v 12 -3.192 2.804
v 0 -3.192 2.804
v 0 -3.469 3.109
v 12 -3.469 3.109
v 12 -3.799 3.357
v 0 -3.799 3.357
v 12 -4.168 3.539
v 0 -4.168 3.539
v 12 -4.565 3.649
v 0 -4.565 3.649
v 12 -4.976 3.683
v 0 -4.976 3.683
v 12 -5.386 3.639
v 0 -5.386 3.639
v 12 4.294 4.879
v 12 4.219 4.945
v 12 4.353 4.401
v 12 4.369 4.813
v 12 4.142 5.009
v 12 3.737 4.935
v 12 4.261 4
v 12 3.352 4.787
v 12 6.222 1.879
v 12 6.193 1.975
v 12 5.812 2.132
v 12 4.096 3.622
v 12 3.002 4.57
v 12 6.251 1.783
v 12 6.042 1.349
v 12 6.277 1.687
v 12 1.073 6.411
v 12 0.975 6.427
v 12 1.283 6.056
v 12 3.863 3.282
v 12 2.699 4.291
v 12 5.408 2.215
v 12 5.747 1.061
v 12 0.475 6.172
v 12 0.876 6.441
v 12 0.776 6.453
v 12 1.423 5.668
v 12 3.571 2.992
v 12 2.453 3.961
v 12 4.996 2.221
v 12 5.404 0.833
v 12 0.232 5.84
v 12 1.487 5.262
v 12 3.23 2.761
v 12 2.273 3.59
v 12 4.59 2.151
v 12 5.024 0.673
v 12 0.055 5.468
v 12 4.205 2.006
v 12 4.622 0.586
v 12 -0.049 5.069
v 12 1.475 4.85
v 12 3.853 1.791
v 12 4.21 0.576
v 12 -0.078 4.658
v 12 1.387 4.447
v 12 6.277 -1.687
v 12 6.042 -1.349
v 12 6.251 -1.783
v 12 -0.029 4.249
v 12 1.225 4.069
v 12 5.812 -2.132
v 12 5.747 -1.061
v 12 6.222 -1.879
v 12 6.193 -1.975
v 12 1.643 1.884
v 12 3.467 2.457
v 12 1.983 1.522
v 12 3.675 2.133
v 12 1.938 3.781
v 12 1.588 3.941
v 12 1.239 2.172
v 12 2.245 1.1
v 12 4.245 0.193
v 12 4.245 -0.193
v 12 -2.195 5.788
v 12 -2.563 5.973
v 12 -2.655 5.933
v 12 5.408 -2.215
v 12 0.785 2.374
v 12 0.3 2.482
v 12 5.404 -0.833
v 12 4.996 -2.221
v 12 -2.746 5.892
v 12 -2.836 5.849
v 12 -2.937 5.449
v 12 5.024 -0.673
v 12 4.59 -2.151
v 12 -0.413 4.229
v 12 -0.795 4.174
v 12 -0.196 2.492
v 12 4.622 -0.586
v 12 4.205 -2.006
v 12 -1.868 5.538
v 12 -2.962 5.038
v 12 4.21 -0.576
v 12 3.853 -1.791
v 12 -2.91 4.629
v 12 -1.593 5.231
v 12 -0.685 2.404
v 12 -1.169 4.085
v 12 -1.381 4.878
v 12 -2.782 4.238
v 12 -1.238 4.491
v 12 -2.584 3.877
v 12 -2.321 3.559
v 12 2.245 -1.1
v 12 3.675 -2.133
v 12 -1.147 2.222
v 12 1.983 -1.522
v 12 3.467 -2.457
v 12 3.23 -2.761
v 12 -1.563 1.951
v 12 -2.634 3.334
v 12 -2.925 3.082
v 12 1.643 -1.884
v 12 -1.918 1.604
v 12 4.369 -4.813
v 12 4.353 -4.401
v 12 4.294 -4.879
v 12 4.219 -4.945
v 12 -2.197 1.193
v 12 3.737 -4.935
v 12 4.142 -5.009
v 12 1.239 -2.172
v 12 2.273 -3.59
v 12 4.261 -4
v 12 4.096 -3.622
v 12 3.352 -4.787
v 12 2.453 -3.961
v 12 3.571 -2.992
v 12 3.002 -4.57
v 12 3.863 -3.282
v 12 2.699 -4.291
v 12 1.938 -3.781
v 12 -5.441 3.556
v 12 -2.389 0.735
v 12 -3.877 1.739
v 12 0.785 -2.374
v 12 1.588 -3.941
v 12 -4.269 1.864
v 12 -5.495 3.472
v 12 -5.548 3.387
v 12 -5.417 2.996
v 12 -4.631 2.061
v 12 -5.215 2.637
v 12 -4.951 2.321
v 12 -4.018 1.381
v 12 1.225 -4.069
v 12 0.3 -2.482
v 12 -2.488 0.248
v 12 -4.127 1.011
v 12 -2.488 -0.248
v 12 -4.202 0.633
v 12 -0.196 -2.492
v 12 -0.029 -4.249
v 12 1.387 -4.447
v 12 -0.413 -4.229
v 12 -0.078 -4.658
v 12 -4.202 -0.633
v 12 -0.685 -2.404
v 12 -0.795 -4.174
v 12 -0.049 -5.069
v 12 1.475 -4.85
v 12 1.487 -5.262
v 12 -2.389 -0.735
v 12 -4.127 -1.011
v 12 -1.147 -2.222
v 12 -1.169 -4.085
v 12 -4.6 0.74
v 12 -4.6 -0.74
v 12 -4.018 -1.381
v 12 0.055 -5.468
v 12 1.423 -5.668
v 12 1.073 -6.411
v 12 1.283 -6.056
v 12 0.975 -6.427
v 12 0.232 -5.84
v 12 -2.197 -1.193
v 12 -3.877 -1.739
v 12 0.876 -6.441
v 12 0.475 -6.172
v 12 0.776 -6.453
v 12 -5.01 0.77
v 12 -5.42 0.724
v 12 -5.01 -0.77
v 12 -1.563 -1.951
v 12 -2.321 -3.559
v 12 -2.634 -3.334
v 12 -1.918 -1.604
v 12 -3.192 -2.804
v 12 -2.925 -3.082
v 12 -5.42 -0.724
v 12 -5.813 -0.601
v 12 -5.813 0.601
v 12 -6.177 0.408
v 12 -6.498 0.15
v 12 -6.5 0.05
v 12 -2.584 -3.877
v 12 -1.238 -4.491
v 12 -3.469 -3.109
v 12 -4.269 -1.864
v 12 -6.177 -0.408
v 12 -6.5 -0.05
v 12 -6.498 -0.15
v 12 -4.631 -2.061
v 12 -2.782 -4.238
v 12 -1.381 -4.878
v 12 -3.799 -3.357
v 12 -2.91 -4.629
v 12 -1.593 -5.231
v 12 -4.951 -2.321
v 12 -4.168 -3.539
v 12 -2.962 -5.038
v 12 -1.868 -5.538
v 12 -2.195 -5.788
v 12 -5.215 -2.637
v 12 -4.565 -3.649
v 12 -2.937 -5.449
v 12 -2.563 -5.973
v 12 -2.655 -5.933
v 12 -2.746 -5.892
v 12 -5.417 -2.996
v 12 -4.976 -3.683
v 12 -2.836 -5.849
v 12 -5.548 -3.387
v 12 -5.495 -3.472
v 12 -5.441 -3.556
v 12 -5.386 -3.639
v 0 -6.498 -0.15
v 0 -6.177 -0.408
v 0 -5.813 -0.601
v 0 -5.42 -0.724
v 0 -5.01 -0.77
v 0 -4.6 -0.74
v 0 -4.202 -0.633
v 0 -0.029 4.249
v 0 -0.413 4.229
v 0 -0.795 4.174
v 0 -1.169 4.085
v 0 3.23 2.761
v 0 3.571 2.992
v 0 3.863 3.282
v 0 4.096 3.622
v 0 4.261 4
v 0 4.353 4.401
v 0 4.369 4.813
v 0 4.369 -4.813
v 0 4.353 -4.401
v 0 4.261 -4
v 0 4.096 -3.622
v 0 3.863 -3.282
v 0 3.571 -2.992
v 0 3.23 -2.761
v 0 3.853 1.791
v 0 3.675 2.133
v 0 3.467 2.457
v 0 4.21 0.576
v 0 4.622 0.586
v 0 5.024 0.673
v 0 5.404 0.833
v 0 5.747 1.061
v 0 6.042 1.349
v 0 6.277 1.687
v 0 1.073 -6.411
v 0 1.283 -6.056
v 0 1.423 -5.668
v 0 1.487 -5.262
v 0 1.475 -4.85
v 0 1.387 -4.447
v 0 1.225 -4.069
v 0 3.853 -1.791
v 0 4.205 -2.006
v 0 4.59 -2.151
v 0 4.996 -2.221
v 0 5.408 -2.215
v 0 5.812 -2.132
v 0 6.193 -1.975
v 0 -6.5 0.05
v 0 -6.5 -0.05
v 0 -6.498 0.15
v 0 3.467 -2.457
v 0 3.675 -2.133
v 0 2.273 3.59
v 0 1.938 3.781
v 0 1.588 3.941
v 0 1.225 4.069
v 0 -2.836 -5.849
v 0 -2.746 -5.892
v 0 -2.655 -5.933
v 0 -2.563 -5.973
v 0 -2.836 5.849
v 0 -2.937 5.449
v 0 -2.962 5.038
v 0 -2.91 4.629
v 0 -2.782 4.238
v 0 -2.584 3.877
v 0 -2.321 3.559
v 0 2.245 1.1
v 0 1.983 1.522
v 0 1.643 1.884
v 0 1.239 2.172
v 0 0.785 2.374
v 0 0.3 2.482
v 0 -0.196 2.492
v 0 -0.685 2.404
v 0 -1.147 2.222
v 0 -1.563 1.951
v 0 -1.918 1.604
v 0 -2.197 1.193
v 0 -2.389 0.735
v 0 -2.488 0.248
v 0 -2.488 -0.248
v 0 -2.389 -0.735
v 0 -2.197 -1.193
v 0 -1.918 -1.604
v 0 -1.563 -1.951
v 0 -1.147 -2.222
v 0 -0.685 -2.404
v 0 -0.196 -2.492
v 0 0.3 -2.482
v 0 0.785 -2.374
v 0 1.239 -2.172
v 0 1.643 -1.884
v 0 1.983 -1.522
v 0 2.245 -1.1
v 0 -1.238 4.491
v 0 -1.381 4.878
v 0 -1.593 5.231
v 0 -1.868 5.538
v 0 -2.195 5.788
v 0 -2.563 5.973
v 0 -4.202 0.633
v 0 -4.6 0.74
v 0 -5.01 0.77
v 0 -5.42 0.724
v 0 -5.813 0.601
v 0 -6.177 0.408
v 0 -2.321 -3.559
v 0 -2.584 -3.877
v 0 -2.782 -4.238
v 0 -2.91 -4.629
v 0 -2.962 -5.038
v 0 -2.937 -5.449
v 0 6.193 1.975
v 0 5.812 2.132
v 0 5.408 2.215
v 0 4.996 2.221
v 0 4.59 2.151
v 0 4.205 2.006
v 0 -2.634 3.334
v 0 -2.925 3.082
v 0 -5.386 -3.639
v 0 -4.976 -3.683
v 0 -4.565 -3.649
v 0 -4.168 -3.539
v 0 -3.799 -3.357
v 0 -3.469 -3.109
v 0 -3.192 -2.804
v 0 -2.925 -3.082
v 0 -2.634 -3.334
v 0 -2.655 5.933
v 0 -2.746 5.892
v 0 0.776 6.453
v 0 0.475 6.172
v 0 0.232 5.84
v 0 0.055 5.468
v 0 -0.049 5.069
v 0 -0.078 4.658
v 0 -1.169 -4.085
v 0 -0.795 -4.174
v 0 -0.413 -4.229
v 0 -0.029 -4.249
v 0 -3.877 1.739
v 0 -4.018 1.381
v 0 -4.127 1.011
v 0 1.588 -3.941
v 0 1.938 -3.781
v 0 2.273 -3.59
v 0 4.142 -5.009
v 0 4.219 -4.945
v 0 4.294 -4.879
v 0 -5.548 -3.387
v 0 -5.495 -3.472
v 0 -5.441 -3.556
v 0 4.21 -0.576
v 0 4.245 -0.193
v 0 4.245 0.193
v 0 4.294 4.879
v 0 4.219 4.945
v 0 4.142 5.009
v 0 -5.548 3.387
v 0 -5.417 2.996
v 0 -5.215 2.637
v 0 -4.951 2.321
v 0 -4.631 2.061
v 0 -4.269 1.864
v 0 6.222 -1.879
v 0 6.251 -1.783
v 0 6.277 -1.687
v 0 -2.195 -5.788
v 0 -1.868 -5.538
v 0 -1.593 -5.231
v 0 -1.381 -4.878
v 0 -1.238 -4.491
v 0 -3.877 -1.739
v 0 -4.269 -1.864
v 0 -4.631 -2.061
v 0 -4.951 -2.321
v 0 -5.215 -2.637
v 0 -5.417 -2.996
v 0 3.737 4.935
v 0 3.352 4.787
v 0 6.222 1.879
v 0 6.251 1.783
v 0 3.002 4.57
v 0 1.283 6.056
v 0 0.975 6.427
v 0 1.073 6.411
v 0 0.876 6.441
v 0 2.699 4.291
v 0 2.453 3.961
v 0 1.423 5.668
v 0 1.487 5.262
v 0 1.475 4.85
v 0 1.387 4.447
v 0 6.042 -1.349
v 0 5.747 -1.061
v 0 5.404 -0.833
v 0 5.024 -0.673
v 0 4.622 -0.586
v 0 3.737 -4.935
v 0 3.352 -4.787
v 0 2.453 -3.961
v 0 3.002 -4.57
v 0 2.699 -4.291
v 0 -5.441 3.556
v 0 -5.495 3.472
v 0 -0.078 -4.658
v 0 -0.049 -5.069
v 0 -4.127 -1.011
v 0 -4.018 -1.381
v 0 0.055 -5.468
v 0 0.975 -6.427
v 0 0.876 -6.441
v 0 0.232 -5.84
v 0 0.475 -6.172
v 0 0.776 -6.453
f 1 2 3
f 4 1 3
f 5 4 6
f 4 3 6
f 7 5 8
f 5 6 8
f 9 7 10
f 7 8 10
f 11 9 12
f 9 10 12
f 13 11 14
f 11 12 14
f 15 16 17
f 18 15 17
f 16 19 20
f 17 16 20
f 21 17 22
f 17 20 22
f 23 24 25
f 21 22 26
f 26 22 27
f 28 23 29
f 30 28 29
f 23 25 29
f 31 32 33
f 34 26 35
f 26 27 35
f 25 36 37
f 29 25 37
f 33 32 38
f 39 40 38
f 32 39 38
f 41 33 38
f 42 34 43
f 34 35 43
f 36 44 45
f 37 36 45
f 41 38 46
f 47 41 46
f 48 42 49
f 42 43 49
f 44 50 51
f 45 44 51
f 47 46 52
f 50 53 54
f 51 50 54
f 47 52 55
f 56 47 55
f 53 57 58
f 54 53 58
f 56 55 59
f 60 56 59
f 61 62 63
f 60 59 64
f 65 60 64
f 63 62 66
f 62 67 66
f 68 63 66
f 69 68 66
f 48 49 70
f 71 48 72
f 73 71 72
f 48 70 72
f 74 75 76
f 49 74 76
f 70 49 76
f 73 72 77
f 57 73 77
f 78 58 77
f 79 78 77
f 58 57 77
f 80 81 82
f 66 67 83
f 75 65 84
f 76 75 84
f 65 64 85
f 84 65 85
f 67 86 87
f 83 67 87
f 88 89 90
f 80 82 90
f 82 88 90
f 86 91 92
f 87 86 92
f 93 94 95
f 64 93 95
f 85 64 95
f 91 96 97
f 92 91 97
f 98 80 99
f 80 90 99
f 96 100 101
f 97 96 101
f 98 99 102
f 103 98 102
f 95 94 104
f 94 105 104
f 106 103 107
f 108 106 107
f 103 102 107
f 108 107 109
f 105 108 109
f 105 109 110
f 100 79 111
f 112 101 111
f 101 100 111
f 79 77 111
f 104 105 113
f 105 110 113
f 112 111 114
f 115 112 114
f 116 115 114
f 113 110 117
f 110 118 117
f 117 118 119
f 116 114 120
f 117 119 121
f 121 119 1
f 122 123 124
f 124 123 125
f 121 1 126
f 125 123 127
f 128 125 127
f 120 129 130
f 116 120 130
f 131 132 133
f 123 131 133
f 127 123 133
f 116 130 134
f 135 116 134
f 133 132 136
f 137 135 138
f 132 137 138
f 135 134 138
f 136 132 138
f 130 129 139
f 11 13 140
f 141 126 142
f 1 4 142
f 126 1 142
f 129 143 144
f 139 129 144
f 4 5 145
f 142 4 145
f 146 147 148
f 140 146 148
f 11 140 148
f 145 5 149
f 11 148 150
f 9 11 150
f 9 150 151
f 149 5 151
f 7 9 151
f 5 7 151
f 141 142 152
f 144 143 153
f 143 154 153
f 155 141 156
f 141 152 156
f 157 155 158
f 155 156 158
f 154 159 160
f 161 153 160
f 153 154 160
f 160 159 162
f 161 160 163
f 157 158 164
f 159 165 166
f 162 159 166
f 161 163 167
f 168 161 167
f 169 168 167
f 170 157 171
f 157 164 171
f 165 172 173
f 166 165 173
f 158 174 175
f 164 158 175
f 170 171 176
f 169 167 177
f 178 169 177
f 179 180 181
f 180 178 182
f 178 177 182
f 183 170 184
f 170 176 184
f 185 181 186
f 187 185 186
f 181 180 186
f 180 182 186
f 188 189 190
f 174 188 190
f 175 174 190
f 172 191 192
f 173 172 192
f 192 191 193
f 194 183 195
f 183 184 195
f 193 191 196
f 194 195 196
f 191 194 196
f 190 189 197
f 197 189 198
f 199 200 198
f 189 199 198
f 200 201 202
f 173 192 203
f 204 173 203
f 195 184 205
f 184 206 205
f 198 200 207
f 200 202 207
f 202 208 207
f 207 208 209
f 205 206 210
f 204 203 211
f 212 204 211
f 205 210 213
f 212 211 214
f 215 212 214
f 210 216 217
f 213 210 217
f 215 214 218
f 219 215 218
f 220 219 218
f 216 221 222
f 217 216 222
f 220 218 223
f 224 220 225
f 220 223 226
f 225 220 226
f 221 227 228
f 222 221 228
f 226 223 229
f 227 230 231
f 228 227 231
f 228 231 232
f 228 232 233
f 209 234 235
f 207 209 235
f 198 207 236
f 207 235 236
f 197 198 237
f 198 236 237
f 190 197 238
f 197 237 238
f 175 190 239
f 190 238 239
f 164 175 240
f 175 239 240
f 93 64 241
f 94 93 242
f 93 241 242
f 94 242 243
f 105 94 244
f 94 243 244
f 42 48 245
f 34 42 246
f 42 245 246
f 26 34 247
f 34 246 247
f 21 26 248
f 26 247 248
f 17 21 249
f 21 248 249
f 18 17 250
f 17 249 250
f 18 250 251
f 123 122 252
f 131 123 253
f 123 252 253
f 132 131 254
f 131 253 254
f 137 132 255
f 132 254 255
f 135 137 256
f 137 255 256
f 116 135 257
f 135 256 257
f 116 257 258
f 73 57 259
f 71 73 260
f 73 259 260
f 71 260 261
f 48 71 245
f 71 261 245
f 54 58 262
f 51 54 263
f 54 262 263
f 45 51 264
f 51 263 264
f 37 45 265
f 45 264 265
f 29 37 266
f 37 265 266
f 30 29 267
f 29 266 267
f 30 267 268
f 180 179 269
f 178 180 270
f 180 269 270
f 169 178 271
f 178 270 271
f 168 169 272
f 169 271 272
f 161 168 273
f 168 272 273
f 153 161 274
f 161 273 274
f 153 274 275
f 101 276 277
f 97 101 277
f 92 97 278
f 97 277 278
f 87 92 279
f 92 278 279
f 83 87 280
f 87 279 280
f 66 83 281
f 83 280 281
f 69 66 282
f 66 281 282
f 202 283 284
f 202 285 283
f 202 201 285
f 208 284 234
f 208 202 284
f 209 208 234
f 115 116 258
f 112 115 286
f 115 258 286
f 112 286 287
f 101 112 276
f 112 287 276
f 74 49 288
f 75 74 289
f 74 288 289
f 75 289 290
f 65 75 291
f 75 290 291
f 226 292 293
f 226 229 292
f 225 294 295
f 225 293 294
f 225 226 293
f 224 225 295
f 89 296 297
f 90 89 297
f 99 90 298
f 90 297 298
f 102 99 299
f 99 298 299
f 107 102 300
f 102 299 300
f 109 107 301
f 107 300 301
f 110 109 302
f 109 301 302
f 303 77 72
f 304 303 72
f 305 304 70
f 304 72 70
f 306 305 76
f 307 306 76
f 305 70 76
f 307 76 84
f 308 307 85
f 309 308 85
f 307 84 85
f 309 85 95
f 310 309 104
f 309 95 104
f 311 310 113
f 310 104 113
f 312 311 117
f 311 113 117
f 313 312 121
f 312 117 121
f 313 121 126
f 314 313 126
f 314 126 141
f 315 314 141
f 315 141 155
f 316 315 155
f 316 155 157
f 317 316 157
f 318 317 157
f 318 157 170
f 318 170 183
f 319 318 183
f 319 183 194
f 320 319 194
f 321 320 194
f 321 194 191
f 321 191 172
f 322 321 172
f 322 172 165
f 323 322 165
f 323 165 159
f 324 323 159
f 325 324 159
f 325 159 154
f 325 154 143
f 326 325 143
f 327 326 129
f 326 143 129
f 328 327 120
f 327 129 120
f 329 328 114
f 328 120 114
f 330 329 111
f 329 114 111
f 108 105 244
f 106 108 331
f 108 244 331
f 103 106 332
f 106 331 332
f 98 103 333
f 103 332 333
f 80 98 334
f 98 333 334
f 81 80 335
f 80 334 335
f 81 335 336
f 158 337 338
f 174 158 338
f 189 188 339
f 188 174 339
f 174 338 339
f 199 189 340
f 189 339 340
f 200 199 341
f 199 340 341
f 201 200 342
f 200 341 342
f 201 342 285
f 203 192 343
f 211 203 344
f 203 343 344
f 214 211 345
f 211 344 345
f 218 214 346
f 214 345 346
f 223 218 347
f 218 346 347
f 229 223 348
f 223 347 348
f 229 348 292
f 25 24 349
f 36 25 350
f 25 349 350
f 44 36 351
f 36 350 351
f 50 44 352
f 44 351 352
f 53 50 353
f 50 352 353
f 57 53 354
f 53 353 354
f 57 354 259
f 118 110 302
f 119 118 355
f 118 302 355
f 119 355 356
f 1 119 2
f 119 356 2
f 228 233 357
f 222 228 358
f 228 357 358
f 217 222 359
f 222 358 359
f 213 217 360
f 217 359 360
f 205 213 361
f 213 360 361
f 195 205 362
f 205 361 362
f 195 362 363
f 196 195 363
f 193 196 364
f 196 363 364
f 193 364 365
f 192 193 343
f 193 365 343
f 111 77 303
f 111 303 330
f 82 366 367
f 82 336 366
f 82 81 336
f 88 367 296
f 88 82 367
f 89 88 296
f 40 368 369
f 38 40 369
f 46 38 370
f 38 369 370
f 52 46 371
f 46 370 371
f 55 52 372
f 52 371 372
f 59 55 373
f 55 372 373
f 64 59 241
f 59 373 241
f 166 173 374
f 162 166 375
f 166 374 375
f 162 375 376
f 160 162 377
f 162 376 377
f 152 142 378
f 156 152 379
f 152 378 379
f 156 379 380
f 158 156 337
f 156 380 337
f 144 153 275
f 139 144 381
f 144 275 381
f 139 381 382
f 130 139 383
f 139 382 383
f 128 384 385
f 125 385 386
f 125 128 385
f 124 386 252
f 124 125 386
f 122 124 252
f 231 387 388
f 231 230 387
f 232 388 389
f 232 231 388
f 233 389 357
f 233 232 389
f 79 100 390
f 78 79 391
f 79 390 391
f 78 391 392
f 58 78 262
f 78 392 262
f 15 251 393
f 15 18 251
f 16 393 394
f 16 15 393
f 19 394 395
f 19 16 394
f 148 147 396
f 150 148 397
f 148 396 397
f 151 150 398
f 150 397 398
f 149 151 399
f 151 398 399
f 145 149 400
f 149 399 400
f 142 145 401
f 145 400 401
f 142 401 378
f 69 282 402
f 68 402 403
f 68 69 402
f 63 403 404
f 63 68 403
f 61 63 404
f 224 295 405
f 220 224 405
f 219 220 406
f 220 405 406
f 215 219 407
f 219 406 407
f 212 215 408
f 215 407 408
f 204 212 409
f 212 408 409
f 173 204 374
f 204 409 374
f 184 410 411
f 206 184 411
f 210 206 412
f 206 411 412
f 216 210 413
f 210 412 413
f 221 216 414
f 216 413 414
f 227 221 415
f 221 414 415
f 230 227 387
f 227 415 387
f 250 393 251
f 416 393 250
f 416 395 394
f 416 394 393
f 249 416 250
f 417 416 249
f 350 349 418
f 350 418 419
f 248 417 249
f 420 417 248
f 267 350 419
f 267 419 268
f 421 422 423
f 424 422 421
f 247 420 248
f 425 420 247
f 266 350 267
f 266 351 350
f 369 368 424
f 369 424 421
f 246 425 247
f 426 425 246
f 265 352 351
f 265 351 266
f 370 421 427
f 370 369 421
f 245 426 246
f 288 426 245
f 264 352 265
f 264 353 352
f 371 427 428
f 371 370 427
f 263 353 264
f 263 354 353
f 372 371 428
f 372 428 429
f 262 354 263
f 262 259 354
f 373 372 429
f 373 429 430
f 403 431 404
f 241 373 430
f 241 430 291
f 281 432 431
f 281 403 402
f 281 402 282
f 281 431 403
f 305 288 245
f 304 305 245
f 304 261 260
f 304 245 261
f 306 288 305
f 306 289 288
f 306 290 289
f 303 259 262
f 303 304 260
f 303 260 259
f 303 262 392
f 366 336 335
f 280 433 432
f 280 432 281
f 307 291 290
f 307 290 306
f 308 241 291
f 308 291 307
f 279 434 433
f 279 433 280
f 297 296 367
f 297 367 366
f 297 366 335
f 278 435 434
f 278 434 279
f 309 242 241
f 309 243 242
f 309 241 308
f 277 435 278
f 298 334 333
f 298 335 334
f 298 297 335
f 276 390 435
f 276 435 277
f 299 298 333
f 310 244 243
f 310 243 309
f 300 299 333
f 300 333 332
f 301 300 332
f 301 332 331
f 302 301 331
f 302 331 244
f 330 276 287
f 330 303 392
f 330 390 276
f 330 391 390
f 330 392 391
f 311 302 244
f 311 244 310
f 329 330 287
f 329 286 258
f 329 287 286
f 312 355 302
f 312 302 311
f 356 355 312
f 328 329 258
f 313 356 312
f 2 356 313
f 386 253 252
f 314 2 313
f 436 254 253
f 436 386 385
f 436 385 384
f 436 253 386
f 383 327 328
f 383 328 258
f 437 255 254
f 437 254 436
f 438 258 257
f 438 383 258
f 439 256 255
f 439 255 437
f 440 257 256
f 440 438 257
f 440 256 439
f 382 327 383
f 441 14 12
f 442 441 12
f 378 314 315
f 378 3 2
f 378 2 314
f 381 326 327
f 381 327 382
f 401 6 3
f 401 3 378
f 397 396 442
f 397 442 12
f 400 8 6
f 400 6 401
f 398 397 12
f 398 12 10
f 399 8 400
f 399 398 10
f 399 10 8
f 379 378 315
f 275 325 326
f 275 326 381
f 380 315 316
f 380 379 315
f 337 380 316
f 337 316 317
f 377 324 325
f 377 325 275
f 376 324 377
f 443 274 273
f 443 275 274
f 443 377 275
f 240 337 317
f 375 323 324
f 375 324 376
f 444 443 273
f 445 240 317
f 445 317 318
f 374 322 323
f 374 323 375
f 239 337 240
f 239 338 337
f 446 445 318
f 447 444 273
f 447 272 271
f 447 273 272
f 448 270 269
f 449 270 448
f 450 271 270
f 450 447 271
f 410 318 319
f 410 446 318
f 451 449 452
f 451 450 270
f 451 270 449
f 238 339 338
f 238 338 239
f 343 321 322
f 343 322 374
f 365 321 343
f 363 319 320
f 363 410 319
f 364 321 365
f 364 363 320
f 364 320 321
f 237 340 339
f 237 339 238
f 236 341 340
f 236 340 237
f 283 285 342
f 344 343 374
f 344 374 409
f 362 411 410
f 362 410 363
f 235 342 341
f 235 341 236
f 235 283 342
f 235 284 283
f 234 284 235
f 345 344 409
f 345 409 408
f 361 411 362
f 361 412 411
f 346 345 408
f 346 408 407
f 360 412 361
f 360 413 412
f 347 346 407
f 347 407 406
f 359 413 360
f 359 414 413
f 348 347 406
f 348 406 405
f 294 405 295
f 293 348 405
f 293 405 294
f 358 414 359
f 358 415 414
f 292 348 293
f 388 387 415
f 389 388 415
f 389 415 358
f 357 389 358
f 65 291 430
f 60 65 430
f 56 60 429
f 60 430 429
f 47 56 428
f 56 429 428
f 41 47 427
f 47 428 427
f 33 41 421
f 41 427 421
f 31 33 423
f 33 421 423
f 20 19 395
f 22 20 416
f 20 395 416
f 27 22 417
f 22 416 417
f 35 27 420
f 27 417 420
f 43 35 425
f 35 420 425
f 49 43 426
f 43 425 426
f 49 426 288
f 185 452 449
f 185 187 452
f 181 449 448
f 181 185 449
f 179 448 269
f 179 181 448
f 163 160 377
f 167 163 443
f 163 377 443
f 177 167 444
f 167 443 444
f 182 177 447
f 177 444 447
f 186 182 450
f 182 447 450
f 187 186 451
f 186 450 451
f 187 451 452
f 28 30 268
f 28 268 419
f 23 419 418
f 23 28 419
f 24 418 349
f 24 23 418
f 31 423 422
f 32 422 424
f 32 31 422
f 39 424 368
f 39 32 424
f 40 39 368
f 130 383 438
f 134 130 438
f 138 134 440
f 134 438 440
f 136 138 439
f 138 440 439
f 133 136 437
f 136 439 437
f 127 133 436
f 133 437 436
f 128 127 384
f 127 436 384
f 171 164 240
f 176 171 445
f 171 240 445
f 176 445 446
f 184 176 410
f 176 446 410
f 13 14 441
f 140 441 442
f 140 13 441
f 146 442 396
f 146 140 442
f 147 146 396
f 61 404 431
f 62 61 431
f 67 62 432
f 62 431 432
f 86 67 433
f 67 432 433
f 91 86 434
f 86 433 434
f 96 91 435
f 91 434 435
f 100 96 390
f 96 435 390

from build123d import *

# Parameters (mm, degrees)
BASPROSKE_W         = 12
BASPROSKE_H         = 6.5
TOOTHCUT_DEPTH      = 16.116216458
TEETHCUTS_COUNT     = 11
TEETHCUTS_ANGLE     = 327.272727273
BORSKE_R            = 2.5
BORE_DEPTH          = 50.0000508
BOSS_EXTRUDE1_DEPTH = 12


with BuildPart() as part:
    # BasProSke → Base-Revolve (revolve)
    with BuildSketch(Plane(origin=(0, 0, 0), x_dir=(1, 0, 0), z_dir=(0, 1, 0)), mode=Mode.PRIVATE) as base_revolve_sk:
        with Locations((6, 3.25)):
            Rectangle(BASPROSKE_W, BASPROSKE_H)
    revolve(base_revolve_sk.sketch.rotate(Axis((-10, 0, 0), (1, 0, 0)), 180), axis=Axis((-10, 0, 0), (1, 0, 0)))

    # TooCutSke → ToothCut (cut, through all)
    with BuildSketch(Plane(origin=(0, 0, 0), x_dir=(0, 0, -1), z_dir=(1, 0, 0))):
        with BuildLine():
            ThreePointArc((0.576045815, 4.209771041), (0, 4.249), (-0.576045815, 4.209771041))
            ThreePointArc((-0.576045815, 4.209771041), (-0.841371334, 5.420048739), (-1.718652745, 6.295004202))
            ThreePointArc((-1.718652745, 6.295004202), (0, 6.5254), (1.718652745, 6.295004202))
            ThreePointArc((1.718652745, 6.295004202), (0.841371334, 5.420048739), (0.576045815, 4.209771041))
        make_face()
    toothcut = extrude(amount=TOOTHCUT_DEPTH, mode=Mode.SUBTRACT)

    # TeethCuts: ToothCut ×11 about axis
    teethcuts_axis = Axis((-10, 0, 0), (1, 0, 0))
    for i in range(1, TEETHCUTS_COUNT):
        add(toothcut.rotate(teethcuts_axis, i * TEETHCUTS_ANGLE / (TEETHCUTS_COUNT - 1)), mode=Mode.SUBTRACT)

    # BorSke → Bore (cut, symmetric)
    with BuildSketch(Plane(origin=(0, 0, 0), x_dir=(0, 0, -1), z_dir=(1, 0, 0))):
        with Locations(Location((0, 0, 0), (0, 0, 180))):
            Circle(BORSKE_R)
    extrude(amount=BORE_DEPTH, both=True, mode=Mode.SUBTRACT)

    # Sketch1 → Boss-Extrude1 (add)
    with BuildSketch(Plane(origin=(12, 0, 0), x_dir=(0, 0, -1), z_dir=(1, 0, 0))):
        with BuildLine():
            Line((-1.1, 2.244994432), (1.1, 2.244994432))
            ThreePointArc((1.1, 2.244994432), (0, 2.5), (-1.1, 2.244994432))
        make_face()
    extrude(amount=-BOSS_EXTRUDE1_DEPTH)


solid = part.part
